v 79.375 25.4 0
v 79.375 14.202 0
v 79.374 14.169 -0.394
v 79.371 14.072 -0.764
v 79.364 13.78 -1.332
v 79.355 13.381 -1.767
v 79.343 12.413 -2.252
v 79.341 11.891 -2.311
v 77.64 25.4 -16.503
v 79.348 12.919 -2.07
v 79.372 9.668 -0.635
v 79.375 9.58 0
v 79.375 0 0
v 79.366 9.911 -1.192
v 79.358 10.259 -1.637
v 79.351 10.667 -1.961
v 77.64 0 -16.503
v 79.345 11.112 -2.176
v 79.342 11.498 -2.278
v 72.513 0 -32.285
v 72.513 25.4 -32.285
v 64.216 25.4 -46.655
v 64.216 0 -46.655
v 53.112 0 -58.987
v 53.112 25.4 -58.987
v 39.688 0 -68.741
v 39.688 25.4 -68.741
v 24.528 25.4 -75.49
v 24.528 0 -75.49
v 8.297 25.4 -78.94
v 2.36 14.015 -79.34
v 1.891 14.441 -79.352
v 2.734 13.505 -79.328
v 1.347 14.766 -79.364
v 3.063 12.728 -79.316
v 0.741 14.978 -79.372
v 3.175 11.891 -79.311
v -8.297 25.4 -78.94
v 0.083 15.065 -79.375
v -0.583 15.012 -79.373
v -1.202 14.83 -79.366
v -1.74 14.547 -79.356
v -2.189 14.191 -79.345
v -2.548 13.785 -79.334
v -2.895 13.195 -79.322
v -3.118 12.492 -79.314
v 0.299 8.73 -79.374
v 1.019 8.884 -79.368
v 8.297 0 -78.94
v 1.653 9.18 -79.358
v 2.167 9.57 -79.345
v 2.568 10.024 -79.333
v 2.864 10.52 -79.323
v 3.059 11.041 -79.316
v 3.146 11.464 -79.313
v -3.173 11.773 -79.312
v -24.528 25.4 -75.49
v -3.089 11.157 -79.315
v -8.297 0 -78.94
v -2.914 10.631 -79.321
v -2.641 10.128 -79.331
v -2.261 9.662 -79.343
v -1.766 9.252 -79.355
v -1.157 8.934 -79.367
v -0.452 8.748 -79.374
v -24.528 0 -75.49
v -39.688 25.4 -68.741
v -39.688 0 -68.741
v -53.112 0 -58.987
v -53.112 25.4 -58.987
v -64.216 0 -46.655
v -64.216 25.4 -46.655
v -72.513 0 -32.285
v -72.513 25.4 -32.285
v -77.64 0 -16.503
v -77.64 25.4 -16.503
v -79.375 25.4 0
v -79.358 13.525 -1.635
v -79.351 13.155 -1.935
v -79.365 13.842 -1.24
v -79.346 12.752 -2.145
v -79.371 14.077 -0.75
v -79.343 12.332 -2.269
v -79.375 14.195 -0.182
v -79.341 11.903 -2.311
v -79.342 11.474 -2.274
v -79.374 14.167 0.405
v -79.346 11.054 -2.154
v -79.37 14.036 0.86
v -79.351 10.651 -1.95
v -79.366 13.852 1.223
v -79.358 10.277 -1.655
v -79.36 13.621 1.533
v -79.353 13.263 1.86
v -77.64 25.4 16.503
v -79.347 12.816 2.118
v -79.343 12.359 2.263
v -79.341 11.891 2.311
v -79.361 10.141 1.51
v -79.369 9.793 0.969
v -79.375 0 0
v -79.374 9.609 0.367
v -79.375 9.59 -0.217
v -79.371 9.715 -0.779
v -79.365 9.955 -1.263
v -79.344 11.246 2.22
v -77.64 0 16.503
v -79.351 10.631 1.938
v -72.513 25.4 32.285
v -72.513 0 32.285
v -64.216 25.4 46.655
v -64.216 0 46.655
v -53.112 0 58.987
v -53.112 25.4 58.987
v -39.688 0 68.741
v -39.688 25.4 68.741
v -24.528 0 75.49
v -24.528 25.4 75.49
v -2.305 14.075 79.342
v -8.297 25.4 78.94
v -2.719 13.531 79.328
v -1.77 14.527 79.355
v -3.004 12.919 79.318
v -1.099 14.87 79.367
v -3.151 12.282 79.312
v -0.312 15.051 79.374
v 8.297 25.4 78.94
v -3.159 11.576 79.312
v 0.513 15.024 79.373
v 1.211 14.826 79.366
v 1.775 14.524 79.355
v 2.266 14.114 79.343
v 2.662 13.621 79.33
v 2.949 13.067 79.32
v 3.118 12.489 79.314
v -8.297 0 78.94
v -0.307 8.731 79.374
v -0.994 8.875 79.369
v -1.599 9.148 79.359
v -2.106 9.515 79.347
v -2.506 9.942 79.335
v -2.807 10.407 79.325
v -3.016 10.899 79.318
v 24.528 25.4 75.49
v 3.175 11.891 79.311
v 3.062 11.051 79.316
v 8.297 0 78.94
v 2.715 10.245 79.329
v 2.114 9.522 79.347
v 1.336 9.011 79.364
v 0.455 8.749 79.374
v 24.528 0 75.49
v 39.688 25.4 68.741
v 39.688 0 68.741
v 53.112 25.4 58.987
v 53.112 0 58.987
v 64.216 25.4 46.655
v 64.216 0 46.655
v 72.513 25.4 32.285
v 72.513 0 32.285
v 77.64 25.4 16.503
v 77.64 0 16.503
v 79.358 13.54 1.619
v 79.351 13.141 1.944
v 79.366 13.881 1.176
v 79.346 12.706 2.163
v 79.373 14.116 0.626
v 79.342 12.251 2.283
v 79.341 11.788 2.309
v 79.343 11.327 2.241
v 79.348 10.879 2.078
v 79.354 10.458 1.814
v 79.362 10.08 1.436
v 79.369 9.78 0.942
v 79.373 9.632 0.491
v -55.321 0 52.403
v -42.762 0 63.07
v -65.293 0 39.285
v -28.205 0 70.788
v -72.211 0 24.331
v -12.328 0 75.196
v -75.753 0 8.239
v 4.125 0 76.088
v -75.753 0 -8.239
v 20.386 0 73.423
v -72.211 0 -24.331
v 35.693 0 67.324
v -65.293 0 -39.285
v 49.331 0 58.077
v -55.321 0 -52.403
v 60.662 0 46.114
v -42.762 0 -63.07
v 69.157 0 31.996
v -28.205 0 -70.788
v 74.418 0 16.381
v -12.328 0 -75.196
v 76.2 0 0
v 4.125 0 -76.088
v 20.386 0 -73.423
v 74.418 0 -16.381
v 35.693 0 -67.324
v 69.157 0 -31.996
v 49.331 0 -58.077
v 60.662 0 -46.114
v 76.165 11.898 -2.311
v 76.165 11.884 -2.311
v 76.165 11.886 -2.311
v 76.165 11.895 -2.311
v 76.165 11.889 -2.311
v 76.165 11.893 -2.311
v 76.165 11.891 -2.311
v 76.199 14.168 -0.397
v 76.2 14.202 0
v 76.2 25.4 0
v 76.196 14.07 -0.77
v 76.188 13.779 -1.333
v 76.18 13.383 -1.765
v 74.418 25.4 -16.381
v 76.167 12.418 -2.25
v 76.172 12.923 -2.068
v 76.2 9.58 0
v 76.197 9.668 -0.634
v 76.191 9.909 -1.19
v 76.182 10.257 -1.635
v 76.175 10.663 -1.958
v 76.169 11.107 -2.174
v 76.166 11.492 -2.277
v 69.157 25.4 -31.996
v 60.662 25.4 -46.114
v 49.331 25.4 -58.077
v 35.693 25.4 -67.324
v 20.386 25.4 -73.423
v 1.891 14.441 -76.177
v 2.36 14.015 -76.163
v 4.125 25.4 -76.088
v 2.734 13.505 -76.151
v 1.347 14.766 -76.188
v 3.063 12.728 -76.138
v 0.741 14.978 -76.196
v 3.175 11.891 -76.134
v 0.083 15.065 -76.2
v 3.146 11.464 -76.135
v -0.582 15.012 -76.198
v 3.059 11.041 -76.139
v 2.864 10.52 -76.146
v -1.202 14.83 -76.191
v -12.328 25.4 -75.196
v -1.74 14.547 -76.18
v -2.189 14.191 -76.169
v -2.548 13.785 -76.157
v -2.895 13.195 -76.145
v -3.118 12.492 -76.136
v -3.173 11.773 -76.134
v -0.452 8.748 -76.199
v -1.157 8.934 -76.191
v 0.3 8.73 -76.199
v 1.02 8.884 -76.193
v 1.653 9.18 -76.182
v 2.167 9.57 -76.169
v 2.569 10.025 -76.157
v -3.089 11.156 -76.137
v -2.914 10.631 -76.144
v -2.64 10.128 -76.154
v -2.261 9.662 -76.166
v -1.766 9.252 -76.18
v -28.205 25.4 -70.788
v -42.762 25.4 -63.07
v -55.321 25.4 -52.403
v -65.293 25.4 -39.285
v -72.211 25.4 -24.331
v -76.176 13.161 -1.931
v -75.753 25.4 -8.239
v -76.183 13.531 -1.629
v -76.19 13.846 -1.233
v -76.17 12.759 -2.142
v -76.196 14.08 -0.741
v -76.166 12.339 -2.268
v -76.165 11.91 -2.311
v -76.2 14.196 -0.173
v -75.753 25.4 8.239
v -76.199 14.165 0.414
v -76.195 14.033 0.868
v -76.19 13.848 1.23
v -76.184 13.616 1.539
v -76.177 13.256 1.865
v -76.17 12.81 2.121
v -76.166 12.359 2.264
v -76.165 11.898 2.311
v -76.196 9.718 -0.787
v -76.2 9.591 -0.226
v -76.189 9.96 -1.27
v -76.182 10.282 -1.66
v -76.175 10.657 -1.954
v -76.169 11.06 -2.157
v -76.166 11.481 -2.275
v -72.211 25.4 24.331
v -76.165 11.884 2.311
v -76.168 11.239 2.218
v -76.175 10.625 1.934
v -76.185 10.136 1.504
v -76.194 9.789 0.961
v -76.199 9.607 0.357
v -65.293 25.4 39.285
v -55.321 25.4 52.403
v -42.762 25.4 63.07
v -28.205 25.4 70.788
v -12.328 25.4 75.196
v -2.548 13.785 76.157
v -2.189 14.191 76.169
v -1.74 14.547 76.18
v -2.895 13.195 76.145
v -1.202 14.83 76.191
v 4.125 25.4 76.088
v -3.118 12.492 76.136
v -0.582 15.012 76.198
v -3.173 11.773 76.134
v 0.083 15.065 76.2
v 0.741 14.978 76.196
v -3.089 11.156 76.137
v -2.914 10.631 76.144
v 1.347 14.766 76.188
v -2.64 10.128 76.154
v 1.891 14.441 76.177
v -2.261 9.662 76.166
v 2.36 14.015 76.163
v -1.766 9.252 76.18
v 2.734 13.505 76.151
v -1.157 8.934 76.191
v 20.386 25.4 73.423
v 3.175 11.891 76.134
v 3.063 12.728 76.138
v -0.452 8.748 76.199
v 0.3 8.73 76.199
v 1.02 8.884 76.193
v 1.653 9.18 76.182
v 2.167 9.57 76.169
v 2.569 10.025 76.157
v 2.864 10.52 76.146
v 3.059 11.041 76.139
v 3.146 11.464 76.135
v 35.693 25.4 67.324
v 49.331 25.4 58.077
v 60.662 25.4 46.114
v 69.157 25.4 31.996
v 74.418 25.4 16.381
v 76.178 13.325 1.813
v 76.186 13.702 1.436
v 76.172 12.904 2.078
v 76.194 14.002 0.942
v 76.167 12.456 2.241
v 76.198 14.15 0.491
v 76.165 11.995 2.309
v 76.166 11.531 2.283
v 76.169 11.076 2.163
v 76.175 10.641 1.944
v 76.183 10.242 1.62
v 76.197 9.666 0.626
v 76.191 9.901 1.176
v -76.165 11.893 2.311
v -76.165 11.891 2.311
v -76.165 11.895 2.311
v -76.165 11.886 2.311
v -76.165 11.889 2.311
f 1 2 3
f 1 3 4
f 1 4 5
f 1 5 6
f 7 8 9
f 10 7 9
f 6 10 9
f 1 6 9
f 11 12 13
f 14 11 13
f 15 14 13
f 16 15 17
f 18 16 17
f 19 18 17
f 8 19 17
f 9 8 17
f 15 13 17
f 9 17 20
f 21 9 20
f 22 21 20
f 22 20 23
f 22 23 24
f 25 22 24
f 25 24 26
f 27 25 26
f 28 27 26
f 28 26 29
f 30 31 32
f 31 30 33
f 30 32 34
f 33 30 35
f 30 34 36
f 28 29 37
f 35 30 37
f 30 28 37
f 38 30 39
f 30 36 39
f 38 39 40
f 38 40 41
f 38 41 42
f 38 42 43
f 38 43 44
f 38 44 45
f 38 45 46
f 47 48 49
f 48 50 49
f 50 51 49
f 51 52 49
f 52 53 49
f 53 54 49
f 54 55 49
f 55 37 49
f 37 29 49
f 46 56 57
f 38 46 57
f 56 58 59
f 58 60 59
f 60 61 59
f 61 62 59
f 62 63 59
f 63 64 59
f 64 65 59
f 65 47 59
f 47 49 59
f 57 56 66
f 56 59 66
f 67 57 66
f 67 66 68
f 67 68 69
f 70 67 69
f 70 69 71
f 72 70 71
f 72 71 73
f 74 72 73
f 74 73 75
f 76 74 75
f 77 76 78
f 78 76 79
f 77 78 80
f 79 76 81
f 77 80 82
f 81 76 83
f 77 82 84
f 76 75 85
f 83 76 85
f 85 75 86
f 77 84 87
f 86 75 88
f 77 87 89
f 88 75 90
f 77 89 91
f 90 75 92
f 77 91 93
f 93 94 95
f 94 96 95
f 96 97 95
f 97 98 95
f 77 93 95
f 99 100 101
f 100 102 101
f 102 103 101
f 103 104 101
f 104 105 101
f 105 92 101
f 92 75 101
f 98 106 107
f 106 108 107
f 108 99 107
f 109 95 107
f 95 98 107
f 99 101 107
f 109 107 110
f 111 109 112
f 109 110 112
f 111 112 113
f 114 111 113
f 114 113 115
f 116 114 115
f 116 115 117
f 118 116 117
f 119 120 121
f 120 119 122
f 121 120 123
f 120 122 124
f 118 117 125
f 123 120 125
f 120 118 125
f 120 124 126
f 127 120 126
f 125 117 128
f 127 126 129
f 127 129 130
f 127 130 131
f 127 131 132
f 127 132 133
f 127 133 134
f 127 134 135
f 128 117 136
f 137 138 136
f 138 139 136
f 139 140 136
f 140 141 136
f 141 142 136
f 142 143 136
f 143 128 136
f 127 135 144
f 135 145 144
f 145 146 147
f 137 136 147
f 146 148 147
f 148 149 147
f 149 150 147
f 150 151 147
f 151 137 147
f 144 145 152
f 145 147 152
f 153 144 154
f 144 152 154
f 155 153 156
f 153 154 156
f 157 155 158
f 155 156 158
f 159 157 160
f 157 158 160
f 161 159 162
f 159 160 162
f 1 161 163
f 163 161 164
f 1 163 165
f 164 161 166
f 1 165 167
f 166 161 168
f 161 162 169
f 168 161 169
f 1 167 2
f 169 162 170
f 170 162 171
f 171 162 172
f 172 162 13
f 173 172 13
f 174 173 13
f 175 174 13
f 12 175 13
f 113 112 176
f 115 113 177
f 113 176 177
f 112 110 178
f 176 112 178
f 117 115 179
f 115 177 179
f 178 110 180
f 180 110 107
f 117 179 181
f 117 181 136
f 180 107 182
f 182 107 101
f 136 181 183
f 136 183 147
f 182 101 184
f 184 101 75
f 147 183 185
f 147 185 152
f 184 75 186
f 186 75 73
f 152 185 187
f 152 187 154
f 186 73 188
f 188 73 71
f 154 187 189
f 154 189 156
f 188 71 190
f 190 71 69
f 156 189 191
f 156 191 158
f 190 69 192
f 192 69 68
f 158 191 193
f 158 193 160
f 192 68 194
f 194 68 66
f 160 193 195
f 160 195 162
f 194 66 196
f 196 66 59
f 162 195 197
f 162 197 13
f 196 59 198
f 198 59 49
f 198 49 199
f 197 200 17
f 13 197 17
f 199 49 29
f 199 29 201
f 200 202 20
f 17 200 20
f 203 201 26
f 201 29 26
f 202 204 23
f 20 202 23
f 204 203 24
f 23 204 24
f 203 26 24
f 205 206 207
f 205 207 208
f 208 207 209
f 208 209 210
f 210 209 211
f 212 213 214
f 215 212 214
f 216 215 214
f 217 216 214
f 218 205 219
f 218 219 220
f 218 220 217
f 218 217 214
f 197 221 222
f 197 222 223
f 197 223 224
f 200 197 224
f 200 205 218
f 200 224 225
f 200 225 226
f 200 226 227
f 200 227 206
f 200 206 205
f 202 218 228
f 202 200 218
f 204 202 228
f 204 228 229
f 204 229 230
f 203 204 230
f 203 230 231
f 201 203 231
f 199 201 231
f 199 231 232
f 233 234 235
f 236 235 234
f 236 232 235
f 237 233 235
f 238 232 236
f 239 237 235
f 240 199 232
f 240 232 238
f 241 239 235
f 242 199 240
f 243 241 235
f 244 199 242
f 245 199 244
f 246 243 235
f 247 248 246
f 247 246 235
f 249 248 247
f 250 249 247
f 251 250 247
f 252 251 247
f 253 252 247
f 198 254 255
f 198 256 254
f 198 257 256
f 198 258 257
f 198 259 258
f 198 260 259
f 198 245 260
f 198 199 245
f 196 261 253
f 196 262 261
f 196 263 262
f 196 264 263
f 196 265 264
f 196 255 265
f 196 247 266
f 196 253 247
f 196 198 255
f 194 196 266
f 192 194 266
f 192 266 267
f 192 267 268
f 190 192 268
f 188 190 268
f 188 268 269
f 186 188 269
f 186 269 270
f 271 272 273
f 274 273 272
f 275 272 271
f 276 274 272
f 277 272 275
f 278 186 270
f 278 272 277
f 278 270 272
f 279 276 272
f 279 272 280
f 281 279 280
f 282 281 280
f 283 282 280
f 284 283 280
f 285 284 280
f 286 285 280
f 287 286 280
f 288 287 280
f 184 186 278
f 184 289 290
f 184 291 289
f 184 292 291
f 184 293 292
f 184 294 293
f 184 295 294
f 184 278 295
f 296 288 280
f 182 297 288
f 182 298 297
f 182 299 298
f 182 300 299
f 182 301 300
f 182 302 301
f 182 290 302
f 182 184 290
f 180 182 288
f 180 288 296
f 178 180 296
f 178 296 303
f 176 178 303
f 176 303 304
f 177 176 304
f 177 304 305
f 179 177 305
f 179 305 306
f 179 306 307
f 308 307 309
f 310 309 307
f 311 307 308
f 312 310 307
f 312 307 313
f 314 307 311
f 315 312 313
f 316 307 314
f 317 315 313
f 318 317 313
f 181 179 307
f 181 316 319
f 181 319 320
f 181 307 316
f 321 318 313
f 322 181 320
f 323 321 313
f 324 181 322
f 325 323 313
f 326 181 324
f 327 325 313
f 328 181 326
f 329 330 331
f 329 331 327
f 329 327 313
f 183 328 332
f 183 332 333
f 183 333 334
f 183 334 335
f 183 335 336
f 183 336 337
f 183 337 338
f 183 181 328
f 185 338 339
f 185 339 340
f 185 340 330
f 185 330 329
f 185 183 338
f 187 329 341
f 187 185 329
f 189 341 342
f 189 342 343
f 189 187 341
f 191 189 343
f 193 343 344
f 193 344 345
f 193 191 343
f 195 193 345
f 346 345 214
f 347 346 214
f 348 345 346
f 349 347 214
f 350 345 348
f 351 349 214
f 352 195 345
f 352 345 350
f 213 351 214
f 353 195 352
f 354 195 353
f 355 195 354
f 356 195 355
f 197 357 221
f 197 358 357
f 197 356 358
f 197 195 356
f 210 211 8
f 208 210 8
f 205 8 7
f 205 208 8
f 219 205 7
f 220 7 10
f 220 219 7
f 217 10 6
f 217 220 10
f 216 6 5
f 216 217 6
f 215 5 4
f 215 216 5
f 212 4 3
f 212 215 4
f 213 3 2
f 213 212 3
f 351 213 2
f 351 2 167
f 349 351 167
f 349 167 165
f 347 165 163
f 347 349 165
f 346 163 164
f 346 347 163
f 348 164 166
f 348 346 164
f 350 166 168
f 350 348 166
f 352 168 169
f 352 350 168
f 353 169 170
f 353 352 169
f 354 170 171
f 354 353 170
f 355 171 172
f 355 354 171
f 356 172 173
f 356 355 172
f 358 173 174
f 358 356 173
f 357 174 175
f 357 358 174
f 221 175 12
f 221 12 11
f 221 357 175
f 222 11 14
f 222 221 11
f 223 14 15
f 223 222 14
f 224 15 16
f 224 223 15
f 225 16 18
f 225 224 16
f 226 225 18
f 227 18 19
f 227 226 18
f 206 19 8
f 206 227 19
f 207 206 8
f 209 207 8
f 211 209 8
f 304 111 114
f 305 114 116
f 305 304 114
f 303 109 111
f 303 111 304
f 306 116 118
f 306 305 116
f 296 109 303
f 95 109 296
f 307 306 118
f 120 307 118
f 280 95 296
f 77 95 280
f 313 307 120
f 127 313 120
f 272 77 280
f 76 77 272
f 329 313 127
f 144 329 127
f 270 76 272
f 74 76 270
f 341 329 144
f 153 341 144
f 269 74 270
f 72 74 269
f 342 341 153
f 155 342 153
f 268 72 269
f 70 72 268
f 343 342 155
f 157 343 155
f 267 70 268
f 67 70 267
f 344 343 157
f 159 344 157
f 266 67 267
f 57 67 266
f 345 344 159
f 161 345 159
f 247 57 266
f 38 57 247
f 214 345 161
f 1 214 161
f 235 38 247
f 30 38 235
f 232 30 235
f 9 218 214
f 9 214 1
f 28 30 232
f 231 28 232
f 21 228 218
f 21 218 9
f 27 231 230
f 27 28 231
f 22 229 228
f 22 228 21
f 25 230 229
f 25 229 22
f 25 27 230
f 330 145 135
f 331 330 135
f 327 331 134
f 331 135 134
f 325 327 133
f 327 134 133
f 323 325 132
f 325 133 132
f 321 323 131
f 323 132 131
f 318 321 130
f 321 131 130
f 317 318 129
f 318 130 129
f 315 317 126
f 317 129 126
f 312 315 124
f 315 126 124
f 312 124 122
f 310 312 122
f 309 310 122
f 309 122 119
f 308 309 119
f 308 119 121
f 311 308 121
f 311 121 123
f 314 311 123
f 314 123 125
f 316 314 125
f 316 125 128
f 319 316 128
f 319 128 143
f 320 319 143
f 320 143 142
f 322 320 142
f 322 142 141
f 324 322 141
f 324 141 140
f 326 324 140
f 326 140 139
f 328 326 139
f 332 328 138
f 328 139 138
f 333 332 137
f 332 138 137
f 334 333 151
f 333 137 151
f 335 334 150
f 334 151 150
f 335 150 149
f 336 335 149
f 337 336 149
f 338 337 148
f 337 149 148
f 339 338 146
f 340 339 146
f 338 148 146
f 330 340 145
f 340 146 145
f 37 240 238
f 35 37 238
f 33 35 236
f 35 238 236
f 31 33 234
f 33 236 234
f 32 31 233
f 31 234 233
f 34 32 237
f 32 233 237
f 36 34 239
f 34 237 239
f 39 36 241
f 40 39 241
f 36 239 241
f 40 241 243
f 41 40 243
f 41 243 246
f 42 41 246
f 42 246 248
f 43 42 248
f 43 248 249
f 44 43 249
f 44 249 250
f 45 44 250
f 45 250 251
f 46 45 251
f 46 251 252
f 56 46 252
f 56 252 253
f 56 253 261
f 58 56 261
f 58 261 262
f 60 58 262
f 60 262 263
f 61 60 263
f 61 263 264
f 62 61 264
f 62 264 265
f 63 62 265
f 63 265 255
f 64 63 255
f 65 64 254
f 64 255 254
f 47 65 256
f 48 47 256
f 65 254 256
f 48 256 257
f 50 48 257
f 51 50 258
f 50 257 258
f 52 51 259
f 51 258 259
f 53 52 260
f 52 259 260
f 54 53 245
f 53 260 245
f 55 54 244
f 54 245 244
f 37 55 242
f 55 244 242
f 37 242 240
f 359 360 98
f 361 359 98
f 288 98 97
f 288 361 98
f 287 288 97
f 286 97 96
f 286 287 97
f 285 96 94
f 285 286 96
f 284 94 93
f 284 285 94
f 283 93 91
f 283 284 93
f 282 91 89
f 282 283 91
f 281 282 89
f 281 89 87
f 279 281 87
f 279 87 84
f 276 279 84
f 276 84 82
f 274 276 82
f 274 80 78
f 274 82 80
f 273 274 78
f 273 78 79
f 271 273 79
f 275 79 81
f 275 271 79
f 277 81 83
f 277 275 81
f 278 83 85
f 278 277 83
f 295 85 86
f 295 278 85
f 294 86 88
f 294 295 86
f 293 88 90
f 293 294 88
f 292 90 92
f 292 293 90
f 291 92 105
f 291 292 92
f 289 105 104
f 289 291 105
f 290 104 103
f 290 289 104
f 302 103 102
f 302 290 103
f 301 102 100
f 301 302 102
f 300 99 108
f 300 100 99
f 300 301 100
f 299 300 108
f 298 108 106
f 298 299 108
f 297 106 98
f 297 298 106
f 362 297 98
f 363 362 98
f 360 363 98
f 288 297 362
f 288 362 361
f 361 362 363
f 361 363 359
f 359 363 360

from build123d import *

# Parameters (mm, degrees)
SKETCH1_R               = 79.375
SKETCH1_R_2             = 76.2
BOSS_EXTRUDE1_DEPTH     = 25.4
CUT_EXTRUDE4_START      = -3.210064
SKETCH2_R               = 2.3114
CUT_EXTRUDE4_DEPTH      = 3.210064
CIRPATTERN1_COUNT       = 4
SKETCH4_R               = 3.175
CUT_EXTRUDE6_DEPTH      = 1.000000113
CUT_EXTRUDE6_DEPTH_BACK = 159.750000113


with BuildPart() as part:
    # Sketch1 → Boss-Extrude1 (new body)
    with BuildSketch(Plane(origin=(0, 0, 0), x_dir=(1, 0, 0), z_dir=(0, 1, 0))):
        Circle(SKETCH1_R)
        Circle(SKETCH1_R_2, mode=Mode.SUBTRACT)
    extrude(amount=BOSS_EXTRUDE1_DEPTH)

    # Sketch2 → Cut-Extrude4 (cut)
    with BuildSketch(Plane.XY.offset(79.375).offset(CUT_EXTRUDE4_START)):
        with Locations((0, 11.890925676)):
            Circle(SKETCH2_R)
    cut_extrude4 = extrude(amount=CUT_EXTRUDE4_DEPTH, mode=Mode.SUBTRACT)

    # CirPattern1: Cut-Extrude4 ×4 about axis
    cirpattern1_axis = Axis((0, 25.4, 0), (0, -1, 0))
    for i in range(1, CIRPATTERN1_COUNT):
        add(cut_extrude4.rotate(cirpattern1_axis, i * 360 / CIRPATTERN1_COUNT), mode=Mode.SUBTRACT)

    # Sketch4 → Cut-Extrude6 (cut, two sides)
    with BuildSketch(Plane.XY.offset(79.375)) as cut_extrude6_sk:
        with Locations((0, 11.890925676)):
            Circle(SKETCH4_R)
    extrude(amount=CUT_EXTRUDE6_DEPTH, mode=Mode.SUBTRACT)
    extrude(cut_extrude6_sk.sketch, amount=-CUT_EXTRUDE6_DEPTH_BACK, mode=Mode.SUBTRACT)


solid = part.part
